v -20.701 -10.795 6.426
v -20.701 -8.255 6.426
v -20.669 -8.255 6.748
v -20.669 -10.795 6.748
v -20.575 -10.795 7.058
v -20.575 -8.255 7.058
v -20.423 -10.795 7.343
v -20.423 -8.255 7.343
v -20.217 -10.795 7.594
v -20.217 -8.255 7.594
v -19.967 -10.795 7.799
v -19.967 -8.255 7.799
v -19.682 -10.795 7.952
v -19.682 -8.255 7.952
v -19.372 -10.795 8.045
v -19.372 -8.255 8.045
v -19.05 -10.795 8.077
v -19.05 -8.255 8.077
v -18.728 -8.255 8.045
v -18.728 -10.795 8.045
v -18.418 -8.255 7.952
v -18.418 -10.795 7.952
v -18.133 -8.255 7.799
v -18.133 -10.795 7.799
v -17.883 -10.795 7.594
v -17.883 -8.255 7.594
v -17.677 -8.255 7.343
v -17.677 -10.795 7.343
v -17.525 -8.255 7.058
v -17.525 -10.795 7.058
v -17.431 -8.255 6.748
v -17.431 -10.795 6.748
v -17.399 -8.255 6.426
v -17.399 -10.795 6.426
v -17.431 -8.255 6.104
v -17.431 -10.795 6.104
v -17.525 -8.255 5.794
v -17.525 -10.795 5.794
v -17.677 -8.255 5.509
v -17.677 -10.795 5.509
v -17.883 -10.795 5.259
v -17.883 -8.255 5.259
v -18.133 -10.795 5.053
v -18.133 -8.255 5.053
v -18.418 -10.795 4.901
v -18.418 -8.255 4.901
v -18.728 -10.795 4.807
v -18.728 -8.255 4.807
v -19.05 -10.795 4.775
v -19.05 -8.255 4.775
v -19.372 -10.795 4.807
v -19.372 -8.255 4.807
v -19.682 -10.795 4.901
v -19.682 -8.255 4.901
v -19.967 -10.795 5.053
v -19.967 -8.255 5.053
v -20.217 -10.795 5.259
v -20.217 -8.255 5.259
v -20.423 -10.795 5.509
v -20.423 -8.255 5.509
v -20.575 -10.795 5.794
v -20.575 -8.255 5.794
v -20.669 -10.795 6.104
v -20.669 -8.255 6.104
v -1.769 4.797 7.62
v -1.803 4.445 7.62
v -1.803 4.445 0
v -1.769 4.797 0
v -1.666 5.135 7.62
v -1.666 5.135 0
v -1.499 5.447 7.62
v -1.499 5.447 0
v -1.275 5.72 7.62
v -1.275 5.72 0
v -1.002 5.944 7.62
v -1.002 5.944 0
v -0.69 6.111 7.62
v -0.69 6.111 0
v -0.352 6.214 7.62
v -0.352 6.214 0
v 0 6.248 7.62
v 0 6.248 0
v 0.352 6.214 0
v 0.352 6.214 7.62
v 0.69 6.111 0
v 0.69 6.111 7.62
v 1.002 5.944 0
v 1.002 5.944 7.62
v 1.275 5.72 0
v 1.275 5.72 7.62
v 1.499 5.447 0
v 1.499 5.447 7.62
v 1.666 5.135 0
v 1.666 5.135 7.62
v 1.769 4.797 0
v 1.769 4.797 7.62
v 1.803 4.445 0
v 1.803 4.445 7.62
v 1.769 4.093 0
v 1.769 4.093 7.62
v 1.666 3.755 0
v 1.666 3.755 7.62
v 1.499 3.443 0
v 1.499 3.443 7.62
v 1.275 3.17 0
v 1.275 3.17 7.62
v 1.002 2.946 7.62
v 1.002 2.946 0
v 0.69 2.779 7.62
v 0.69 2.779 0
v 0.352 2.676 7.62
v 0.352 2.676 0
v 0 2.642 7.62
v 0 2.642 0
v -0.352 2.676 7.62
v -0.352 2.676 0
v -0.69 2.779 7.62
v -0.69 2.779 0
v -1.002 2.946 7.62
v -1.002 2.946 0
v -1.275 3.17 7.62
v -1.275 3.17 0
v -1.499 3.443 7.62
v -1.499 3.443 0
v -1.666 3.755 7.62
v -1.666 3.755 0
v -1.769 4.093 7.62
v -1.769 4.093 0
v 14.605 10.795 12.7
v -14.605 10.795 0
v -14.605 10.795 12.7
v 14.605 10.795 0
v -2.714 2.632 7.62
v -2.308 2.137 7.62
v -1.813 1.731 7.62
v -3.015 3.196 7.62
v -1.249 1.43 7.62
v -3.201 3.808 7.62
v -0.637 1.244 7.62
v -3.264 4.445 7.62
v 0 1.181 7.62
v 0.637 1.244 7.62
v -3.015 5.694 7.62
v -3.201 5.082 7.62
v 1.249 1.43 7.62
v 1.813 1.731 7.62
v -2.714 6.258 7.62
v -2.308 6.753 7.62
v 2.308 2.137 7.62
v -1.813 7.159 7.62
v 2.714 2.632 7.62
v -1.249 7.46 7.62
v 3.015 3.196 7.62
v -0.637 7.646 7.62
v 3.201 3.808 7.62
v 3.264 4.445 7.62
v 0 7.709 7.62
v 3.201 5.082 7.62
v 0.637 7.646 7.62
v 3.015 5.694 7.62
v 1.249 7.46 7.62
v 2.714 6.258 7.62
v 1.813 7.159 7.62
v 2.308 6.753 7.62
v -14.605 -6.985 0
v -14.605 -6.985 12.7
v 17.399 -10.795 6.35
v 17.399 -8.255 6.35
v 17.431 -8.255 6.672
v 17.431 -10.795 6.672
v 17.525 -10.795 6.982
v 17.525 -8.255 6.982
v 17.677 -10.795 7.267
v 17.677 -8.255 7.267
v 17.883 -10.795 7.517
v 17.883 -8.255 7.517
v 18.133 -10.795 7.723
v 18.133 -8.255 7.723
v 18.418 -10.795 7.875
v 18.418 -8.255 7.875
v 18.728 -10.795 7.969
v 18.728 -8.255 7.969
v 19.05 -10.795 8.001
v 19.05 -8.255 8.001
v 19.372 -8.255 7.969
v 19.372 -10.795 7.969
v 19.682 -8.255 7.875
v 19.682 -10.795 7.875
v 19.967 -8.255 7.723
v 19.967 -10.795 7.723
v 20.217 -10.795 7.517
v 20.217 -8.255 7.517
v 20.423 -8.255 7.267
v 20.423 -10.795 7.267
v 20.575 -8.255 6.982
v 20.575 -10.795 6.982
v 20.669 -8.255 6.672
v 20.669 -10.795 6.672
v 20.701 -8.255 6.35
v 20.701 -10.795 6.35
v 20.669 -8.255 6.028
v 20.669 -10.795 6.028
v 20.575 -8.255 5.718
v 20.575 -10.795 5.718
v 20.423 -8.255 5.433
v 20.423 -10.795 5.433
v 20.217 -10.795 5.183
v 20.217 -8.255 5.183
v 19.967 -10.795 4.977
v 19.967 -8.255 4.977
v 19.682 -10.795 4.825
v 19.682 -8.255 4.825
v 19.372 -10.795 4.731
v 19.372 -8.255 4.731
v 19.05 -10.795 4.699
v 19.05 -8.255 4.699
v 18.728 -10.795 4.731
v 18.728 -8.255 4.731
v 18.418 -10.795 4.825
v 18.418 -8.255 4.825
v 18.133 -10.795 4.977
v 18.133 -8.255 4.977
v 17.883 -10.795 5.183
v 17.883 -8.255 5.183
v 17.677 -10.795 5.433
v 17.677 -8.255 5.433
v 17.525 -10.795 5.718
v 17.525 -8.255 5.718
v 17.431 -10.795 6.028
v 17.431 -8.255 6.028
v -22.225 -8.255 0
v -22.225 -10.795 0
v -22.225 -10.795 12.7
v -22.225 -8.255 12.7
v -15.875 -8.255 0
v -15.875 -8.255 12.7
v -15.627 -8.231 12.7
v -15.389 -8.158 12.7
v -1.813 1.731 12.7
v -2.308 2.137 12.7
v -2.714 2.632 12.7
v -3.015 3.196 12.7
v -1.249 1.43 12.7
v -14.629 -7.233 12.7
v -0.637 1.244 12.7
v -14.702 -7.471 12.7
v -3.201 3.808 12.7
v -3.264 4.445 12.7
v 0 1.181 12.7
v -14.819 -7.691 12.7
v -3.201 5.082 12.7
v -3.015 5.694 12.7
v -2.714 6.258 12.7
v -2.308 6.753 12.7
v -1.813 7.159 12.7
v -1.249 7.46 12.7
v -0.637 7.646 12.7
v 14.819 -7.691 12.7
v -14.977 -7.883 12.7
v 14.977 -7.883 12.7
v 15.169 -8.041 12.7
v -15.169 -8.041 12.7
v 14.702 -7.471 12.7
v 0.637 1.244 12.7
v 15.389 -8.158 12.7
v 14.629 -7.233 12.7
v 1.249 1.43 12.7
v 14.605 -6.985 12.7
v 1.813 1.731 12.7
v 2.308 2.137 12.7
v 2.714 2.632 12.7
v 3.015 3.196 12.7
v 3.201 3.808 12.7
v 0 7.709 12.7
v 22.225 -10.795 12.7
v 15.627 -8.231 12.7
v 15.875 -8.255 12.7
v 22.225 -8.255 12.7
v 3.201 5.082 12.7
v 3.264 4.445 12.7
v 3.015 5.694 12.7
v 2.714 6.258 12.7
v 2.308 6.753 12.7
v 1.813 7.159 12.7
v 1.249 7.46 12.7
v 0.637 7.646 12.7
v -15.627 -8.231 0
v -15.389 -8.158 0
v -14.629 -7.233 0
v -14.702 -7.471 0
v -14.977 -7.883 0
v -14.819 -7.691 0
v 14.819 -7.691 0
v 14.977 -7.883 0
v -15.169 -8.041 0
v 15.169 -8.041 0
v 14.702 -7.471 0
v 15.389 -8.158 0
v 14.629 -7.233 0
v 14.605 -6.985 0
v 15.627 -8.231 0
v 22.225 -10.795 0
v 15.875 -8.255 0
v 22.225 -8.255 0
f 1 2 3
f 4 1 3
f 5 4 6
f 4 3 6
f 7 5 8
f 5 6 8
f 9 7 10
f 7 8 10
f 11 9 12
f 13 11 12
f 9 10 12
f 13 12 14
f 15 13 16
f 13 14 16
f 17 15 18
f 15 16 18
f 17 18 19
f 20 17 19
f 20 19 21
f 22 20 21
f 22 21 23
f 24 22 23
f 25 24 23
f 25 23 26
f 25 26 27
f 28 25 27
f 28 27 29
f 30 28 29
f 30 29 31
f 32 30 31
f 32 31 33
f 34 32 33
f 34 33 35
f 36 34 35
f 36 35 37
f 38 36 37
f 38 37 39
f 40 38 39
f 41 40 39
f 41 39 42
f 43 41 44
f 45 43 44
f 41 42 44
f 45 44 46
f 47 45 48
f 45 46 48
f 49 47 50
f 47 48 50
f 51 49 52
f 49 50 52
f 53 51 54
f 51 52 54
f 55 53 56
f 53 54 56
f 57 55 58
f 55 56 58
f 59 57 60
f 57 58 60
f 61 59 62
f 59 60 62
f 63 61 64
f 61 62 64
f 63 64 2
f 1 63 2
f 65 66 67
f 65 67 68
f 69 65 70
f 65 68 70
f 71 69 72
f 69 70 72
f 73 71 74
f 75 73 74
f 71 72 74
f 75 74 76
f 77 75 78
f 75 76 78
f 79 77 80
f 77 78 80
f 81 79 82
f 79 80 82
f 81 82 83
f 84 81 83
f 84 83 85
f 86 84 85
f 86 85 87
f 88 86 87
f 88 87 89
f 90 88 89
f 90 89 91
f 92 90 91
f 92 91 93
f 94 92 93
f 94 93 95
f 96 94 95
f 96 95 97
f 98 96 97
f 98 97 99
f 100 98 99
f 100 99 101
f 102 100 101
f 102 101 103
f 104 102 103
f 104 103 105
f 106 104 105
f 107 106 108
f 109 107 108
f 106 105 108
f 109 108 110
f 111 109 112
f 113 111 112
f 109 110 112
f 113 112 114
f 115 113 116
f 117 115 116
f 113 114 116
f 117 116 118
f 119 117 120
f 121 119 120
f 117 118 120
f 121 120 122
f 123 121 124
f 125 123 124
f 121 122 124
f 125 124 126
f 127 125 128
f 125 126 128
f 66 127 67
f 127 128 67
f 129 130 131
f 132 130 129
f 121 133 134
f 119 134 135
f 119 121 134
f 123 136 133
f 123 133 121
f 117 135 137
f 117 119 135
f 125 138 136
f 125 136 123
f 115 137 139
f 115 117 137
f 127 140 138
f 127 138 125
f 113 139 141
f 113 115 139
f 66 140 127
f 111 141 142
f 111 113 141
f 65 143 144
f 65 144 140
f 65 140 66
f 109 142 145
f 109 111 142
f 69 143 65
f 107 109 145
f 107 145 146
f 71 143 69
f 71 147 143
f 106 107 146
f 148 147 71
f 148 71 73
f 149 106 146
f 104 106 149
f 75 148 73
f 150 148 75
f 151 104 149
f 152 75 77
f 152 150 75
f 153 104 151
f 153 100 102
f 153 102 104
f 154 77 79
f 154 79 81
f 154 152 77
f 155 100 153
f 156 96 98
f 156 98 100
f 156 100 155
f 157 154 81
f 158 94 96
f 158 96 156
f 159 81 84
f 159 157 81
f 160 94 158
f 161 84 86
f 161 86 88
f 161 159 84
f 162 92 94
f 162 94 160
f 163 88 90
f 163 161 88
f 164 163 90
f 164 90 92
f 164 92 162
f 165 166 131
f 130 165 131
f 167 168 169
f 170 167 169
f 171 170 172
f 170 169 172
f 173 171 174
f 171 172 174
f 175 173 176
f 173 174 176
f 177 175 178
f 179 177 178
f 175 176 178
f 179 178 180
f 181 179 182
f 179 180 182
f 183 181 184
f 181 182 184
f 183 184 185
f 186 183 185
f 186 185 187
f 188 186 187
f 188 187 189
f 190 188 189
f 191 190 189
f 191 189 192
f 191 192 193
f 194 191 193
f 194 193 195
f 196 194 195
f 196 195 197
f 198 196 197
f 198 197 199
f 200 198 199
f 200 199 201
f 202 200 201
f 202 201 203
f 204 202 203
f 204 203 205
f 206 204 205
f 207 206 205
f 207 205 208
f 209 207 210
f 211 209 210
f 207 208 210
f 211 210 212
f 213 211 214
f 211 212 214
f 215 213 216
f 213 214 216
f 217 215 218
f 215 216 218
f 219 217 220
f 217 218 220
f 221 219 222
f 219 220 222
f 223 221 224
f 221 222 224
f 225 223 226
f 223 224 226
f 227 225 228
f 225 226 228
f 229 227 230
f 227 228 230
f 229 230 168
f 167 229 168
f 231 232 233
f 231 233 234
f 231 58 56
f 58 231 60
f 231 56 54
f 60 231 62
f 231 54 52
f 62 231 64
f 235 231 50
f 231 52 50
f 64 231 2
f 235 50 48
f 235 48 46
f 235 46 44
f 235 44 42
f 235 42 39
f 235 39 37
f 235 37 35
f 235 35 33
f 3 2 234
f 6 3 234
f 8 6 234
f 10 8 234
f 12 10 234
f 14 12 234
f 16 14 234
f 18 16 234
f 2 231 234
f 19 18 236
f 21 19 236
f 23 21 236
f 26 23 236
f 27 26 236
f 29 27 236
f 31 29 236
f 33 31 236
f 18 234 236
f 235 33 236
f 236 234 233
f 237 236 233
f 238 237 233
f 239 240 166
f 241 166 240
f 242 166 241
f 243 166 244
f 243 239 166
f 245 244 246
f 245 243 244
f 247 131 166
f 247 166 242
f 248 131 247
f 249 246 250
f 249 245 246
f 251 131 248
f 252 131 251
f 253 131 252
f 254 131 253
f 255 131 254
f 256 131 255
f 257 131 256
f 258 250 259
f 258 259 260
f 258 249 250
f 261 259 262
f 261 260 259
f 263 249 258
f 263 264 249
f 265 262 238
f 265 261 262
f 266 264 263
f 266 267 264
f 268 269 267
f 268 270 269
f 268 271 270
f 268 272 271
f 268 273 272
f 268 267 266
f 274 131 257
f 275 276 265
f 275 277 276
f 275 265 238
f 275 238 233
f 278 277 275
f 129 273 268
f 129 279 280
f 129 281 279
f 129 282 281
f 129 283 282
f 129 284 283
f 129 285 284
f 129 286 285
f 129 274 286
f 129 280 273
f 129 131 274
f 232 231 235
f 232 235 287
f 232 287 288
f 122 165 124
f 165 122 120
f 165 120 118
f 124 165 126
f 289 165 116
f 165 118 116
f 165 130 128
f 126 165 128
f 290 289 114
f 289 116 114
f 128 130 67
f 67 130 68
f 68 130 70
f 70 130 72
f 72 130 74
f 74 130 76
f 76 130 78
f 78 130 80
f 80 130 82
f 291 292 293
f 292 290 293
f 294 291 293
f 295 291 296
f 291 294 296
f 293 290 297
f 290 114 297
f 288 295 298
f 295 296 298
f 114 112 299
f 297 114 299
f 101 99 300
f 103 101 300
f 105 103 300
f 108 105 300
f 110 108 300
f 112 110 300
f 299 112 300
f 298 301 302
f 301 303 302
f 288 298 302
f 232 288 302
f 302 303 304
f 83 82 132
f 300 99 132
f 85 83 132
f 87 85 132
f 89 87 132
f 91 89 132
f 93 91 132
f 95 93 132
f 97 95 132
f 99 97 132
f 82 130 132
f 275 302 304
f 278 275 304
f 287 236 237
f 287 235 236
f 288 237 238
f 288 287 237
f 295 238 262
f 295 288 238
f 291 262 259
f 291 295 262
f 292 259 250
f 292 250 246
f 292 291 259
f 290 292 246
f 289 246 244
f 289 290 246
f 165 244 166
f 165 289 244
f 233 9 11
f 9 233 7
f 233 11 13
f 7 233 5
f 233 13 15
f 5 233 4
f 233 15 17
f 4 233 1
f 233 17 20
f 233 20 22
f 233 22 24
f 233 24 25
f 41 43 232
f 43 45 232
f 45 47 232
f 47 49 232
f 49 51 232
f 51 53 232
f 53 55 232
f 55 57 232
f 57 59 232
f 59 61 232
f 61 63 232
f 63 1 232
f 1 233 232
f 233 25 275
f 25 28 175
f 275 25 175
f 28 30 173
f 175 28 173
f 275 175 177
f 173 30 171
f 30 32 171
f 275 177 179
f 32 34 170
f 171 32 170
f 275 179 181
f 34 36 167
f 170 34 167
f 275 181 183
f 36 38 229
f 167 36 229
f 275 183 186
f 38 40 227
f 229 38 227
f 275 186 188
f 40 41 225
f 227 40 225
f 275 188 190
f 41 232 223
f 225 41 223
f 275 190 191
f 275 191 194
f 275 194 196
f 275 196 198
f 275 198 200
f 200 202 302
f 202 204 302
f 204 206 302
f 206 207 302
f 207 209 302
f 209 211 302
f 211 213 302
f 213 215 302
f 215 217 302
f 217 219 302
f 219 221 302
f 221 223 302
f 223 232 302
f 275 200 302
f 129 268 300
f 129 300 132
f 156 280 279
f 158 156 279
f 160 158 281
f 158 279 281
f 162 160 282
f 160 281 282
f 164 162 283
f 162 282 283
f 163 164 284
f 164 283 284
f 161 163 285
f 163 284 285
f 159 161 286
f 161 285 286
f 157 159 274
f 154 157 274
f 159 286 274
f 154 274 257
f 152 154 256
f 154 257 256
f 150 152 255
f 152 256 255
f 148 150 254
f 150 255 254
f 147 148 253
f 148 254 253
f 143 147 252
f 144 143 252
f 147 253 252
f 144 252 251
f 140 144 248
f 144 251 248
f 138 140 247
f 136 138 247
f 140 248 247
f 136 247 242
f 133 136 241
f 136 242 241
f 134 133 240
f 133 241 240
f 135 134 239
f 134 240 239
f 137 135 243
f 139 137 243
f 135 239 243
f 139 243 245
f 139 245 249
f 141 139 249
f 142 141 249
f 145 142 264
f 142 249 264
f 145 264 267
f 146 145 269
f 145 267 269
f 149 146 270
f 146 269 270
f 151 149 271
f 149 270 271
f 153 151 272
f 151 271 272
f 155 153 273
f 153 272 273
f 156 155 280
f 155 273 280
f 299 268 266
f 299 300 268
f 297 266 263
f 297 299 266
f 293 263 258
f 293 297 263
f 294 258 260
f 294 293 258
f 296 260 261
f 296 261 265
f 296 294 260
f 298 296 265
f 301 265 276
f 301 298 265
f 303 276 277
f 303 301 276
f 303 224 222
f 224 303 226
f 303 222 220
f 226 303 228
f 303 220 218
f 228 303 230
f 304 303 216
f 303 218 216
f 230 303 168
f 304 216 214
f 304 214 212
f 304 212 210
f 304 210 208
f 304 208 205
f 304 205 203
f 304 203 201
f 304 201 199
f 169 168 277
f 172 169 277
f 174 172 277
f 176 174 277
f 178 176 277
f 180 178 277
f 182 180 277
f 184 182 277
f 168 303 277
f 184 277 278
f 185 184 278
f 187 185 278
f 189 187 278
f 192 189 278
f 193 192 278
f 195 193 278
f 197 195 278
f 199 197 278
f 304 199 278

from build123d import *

# Parameters (mm, degrees)
SKETCH1_W           = 44.45
SKETCH1_H           = 21.59
BOSS_EXTRUDE1_DEPTH = 12.7
SKETCH2_W           = 7.62
SKETCH2_H           = 19.05
CUT_EXTRUDE1_DEPTH  = 12.7
FILLET1_R           = 1.27
FILLET2_R           = 1.27
SKETCH4_R           = 1.651
CUT_EXTRUDE3_DEPTH  = 12.7
SKETCH5_R           = 1.8034
CUT_EXTRUDE4_DEPTH  = 12.7
SKETCH6_R           = 3.2639
CUT_EXTRUDE5_DEPTH  = 5.08


with BuildPart() as part:
    # Sketch1 → Boss-Extrude1 (new body)
    with BuildSketch(Plane.XY):
        Rectangle(SKETCH1_W, SKETCH1_H)
    extrude(amount=BOSS_EXTRUDE1_DEPTH)

    # Sketch2 → Cut-Extrude1 (cut)
    with BuildSketch(Plane.XY.offset(12.7)):
        with Locations((-18.415, 1.27)):
            Rectangle(SKETCH2_W, SKETCH2_H)
        with Locations((18.415, 1.27)):
            Rectangle(SKETCH2_W, SKETCH2_H)
    extrude(amount=-CUT_EXTRUDE1_DEPTH, mode=Mode.SUBTRACT)

    # Fillet1
    fillet1_edges = [part.edges().sort_by_distance(p)[0] for p in [
        (-14.605, -8.255, 6.35),
    ]]
    fillet(fillet1_edges, radius=FILLET1_R)

    # Fillet2
    fillet2_edges = [part.edges().sort_by_distance(p)[0] for p in [
        (14.605, -8.255, 6.35),
    ]]
    fillet(fillet2_edges, radius=FILLET2_R)

    # Sketch4 → Cut-Extrude3 (cut)
    with BuildSketch(Plane(origin=(0, -8.255, 0), x_dir=(1, 0, 0), z_dir=(0, 1, 0))):
        with Locations(Location((19.05, -6.35, 0), (0, 0, 180))):
            Circle(SKETCH4_R)
        with Locations(Location((-19.05, -6.4262, 0), (0, 0, 180))):
            Circle(SKETCH4_R)
    extrude(amount=-CUT_EXTRUDE3_DEPTH, mode=Mode.SUBTRACT)

    # Sketch5 → Cut-Extrude4 (cut)
    with BuildSketch(Plane(origin=(0, 0, 0), x_dir=(-1, 0, 0), z_dir=(0, 0, -1))):
        with Locations((0, 4.445)):
            Circle(SKETCH5_R)
    extrude(amount=-CUT_EXTRUDE4_DEPTH, mode=Mode.SUBTRACT)

    # Sketch6 → Cut-Extrude5 (cut)
    with BuildSketch(Plane.XY.offset(12.7)):
        with Locations((0, 4.445)):
            Circle(SKETCH6_R)
    extrude(amount=-CUT_EXTRUDE5_DEPTH, mode=Mode.SUBTRACT)


solid = part.part
